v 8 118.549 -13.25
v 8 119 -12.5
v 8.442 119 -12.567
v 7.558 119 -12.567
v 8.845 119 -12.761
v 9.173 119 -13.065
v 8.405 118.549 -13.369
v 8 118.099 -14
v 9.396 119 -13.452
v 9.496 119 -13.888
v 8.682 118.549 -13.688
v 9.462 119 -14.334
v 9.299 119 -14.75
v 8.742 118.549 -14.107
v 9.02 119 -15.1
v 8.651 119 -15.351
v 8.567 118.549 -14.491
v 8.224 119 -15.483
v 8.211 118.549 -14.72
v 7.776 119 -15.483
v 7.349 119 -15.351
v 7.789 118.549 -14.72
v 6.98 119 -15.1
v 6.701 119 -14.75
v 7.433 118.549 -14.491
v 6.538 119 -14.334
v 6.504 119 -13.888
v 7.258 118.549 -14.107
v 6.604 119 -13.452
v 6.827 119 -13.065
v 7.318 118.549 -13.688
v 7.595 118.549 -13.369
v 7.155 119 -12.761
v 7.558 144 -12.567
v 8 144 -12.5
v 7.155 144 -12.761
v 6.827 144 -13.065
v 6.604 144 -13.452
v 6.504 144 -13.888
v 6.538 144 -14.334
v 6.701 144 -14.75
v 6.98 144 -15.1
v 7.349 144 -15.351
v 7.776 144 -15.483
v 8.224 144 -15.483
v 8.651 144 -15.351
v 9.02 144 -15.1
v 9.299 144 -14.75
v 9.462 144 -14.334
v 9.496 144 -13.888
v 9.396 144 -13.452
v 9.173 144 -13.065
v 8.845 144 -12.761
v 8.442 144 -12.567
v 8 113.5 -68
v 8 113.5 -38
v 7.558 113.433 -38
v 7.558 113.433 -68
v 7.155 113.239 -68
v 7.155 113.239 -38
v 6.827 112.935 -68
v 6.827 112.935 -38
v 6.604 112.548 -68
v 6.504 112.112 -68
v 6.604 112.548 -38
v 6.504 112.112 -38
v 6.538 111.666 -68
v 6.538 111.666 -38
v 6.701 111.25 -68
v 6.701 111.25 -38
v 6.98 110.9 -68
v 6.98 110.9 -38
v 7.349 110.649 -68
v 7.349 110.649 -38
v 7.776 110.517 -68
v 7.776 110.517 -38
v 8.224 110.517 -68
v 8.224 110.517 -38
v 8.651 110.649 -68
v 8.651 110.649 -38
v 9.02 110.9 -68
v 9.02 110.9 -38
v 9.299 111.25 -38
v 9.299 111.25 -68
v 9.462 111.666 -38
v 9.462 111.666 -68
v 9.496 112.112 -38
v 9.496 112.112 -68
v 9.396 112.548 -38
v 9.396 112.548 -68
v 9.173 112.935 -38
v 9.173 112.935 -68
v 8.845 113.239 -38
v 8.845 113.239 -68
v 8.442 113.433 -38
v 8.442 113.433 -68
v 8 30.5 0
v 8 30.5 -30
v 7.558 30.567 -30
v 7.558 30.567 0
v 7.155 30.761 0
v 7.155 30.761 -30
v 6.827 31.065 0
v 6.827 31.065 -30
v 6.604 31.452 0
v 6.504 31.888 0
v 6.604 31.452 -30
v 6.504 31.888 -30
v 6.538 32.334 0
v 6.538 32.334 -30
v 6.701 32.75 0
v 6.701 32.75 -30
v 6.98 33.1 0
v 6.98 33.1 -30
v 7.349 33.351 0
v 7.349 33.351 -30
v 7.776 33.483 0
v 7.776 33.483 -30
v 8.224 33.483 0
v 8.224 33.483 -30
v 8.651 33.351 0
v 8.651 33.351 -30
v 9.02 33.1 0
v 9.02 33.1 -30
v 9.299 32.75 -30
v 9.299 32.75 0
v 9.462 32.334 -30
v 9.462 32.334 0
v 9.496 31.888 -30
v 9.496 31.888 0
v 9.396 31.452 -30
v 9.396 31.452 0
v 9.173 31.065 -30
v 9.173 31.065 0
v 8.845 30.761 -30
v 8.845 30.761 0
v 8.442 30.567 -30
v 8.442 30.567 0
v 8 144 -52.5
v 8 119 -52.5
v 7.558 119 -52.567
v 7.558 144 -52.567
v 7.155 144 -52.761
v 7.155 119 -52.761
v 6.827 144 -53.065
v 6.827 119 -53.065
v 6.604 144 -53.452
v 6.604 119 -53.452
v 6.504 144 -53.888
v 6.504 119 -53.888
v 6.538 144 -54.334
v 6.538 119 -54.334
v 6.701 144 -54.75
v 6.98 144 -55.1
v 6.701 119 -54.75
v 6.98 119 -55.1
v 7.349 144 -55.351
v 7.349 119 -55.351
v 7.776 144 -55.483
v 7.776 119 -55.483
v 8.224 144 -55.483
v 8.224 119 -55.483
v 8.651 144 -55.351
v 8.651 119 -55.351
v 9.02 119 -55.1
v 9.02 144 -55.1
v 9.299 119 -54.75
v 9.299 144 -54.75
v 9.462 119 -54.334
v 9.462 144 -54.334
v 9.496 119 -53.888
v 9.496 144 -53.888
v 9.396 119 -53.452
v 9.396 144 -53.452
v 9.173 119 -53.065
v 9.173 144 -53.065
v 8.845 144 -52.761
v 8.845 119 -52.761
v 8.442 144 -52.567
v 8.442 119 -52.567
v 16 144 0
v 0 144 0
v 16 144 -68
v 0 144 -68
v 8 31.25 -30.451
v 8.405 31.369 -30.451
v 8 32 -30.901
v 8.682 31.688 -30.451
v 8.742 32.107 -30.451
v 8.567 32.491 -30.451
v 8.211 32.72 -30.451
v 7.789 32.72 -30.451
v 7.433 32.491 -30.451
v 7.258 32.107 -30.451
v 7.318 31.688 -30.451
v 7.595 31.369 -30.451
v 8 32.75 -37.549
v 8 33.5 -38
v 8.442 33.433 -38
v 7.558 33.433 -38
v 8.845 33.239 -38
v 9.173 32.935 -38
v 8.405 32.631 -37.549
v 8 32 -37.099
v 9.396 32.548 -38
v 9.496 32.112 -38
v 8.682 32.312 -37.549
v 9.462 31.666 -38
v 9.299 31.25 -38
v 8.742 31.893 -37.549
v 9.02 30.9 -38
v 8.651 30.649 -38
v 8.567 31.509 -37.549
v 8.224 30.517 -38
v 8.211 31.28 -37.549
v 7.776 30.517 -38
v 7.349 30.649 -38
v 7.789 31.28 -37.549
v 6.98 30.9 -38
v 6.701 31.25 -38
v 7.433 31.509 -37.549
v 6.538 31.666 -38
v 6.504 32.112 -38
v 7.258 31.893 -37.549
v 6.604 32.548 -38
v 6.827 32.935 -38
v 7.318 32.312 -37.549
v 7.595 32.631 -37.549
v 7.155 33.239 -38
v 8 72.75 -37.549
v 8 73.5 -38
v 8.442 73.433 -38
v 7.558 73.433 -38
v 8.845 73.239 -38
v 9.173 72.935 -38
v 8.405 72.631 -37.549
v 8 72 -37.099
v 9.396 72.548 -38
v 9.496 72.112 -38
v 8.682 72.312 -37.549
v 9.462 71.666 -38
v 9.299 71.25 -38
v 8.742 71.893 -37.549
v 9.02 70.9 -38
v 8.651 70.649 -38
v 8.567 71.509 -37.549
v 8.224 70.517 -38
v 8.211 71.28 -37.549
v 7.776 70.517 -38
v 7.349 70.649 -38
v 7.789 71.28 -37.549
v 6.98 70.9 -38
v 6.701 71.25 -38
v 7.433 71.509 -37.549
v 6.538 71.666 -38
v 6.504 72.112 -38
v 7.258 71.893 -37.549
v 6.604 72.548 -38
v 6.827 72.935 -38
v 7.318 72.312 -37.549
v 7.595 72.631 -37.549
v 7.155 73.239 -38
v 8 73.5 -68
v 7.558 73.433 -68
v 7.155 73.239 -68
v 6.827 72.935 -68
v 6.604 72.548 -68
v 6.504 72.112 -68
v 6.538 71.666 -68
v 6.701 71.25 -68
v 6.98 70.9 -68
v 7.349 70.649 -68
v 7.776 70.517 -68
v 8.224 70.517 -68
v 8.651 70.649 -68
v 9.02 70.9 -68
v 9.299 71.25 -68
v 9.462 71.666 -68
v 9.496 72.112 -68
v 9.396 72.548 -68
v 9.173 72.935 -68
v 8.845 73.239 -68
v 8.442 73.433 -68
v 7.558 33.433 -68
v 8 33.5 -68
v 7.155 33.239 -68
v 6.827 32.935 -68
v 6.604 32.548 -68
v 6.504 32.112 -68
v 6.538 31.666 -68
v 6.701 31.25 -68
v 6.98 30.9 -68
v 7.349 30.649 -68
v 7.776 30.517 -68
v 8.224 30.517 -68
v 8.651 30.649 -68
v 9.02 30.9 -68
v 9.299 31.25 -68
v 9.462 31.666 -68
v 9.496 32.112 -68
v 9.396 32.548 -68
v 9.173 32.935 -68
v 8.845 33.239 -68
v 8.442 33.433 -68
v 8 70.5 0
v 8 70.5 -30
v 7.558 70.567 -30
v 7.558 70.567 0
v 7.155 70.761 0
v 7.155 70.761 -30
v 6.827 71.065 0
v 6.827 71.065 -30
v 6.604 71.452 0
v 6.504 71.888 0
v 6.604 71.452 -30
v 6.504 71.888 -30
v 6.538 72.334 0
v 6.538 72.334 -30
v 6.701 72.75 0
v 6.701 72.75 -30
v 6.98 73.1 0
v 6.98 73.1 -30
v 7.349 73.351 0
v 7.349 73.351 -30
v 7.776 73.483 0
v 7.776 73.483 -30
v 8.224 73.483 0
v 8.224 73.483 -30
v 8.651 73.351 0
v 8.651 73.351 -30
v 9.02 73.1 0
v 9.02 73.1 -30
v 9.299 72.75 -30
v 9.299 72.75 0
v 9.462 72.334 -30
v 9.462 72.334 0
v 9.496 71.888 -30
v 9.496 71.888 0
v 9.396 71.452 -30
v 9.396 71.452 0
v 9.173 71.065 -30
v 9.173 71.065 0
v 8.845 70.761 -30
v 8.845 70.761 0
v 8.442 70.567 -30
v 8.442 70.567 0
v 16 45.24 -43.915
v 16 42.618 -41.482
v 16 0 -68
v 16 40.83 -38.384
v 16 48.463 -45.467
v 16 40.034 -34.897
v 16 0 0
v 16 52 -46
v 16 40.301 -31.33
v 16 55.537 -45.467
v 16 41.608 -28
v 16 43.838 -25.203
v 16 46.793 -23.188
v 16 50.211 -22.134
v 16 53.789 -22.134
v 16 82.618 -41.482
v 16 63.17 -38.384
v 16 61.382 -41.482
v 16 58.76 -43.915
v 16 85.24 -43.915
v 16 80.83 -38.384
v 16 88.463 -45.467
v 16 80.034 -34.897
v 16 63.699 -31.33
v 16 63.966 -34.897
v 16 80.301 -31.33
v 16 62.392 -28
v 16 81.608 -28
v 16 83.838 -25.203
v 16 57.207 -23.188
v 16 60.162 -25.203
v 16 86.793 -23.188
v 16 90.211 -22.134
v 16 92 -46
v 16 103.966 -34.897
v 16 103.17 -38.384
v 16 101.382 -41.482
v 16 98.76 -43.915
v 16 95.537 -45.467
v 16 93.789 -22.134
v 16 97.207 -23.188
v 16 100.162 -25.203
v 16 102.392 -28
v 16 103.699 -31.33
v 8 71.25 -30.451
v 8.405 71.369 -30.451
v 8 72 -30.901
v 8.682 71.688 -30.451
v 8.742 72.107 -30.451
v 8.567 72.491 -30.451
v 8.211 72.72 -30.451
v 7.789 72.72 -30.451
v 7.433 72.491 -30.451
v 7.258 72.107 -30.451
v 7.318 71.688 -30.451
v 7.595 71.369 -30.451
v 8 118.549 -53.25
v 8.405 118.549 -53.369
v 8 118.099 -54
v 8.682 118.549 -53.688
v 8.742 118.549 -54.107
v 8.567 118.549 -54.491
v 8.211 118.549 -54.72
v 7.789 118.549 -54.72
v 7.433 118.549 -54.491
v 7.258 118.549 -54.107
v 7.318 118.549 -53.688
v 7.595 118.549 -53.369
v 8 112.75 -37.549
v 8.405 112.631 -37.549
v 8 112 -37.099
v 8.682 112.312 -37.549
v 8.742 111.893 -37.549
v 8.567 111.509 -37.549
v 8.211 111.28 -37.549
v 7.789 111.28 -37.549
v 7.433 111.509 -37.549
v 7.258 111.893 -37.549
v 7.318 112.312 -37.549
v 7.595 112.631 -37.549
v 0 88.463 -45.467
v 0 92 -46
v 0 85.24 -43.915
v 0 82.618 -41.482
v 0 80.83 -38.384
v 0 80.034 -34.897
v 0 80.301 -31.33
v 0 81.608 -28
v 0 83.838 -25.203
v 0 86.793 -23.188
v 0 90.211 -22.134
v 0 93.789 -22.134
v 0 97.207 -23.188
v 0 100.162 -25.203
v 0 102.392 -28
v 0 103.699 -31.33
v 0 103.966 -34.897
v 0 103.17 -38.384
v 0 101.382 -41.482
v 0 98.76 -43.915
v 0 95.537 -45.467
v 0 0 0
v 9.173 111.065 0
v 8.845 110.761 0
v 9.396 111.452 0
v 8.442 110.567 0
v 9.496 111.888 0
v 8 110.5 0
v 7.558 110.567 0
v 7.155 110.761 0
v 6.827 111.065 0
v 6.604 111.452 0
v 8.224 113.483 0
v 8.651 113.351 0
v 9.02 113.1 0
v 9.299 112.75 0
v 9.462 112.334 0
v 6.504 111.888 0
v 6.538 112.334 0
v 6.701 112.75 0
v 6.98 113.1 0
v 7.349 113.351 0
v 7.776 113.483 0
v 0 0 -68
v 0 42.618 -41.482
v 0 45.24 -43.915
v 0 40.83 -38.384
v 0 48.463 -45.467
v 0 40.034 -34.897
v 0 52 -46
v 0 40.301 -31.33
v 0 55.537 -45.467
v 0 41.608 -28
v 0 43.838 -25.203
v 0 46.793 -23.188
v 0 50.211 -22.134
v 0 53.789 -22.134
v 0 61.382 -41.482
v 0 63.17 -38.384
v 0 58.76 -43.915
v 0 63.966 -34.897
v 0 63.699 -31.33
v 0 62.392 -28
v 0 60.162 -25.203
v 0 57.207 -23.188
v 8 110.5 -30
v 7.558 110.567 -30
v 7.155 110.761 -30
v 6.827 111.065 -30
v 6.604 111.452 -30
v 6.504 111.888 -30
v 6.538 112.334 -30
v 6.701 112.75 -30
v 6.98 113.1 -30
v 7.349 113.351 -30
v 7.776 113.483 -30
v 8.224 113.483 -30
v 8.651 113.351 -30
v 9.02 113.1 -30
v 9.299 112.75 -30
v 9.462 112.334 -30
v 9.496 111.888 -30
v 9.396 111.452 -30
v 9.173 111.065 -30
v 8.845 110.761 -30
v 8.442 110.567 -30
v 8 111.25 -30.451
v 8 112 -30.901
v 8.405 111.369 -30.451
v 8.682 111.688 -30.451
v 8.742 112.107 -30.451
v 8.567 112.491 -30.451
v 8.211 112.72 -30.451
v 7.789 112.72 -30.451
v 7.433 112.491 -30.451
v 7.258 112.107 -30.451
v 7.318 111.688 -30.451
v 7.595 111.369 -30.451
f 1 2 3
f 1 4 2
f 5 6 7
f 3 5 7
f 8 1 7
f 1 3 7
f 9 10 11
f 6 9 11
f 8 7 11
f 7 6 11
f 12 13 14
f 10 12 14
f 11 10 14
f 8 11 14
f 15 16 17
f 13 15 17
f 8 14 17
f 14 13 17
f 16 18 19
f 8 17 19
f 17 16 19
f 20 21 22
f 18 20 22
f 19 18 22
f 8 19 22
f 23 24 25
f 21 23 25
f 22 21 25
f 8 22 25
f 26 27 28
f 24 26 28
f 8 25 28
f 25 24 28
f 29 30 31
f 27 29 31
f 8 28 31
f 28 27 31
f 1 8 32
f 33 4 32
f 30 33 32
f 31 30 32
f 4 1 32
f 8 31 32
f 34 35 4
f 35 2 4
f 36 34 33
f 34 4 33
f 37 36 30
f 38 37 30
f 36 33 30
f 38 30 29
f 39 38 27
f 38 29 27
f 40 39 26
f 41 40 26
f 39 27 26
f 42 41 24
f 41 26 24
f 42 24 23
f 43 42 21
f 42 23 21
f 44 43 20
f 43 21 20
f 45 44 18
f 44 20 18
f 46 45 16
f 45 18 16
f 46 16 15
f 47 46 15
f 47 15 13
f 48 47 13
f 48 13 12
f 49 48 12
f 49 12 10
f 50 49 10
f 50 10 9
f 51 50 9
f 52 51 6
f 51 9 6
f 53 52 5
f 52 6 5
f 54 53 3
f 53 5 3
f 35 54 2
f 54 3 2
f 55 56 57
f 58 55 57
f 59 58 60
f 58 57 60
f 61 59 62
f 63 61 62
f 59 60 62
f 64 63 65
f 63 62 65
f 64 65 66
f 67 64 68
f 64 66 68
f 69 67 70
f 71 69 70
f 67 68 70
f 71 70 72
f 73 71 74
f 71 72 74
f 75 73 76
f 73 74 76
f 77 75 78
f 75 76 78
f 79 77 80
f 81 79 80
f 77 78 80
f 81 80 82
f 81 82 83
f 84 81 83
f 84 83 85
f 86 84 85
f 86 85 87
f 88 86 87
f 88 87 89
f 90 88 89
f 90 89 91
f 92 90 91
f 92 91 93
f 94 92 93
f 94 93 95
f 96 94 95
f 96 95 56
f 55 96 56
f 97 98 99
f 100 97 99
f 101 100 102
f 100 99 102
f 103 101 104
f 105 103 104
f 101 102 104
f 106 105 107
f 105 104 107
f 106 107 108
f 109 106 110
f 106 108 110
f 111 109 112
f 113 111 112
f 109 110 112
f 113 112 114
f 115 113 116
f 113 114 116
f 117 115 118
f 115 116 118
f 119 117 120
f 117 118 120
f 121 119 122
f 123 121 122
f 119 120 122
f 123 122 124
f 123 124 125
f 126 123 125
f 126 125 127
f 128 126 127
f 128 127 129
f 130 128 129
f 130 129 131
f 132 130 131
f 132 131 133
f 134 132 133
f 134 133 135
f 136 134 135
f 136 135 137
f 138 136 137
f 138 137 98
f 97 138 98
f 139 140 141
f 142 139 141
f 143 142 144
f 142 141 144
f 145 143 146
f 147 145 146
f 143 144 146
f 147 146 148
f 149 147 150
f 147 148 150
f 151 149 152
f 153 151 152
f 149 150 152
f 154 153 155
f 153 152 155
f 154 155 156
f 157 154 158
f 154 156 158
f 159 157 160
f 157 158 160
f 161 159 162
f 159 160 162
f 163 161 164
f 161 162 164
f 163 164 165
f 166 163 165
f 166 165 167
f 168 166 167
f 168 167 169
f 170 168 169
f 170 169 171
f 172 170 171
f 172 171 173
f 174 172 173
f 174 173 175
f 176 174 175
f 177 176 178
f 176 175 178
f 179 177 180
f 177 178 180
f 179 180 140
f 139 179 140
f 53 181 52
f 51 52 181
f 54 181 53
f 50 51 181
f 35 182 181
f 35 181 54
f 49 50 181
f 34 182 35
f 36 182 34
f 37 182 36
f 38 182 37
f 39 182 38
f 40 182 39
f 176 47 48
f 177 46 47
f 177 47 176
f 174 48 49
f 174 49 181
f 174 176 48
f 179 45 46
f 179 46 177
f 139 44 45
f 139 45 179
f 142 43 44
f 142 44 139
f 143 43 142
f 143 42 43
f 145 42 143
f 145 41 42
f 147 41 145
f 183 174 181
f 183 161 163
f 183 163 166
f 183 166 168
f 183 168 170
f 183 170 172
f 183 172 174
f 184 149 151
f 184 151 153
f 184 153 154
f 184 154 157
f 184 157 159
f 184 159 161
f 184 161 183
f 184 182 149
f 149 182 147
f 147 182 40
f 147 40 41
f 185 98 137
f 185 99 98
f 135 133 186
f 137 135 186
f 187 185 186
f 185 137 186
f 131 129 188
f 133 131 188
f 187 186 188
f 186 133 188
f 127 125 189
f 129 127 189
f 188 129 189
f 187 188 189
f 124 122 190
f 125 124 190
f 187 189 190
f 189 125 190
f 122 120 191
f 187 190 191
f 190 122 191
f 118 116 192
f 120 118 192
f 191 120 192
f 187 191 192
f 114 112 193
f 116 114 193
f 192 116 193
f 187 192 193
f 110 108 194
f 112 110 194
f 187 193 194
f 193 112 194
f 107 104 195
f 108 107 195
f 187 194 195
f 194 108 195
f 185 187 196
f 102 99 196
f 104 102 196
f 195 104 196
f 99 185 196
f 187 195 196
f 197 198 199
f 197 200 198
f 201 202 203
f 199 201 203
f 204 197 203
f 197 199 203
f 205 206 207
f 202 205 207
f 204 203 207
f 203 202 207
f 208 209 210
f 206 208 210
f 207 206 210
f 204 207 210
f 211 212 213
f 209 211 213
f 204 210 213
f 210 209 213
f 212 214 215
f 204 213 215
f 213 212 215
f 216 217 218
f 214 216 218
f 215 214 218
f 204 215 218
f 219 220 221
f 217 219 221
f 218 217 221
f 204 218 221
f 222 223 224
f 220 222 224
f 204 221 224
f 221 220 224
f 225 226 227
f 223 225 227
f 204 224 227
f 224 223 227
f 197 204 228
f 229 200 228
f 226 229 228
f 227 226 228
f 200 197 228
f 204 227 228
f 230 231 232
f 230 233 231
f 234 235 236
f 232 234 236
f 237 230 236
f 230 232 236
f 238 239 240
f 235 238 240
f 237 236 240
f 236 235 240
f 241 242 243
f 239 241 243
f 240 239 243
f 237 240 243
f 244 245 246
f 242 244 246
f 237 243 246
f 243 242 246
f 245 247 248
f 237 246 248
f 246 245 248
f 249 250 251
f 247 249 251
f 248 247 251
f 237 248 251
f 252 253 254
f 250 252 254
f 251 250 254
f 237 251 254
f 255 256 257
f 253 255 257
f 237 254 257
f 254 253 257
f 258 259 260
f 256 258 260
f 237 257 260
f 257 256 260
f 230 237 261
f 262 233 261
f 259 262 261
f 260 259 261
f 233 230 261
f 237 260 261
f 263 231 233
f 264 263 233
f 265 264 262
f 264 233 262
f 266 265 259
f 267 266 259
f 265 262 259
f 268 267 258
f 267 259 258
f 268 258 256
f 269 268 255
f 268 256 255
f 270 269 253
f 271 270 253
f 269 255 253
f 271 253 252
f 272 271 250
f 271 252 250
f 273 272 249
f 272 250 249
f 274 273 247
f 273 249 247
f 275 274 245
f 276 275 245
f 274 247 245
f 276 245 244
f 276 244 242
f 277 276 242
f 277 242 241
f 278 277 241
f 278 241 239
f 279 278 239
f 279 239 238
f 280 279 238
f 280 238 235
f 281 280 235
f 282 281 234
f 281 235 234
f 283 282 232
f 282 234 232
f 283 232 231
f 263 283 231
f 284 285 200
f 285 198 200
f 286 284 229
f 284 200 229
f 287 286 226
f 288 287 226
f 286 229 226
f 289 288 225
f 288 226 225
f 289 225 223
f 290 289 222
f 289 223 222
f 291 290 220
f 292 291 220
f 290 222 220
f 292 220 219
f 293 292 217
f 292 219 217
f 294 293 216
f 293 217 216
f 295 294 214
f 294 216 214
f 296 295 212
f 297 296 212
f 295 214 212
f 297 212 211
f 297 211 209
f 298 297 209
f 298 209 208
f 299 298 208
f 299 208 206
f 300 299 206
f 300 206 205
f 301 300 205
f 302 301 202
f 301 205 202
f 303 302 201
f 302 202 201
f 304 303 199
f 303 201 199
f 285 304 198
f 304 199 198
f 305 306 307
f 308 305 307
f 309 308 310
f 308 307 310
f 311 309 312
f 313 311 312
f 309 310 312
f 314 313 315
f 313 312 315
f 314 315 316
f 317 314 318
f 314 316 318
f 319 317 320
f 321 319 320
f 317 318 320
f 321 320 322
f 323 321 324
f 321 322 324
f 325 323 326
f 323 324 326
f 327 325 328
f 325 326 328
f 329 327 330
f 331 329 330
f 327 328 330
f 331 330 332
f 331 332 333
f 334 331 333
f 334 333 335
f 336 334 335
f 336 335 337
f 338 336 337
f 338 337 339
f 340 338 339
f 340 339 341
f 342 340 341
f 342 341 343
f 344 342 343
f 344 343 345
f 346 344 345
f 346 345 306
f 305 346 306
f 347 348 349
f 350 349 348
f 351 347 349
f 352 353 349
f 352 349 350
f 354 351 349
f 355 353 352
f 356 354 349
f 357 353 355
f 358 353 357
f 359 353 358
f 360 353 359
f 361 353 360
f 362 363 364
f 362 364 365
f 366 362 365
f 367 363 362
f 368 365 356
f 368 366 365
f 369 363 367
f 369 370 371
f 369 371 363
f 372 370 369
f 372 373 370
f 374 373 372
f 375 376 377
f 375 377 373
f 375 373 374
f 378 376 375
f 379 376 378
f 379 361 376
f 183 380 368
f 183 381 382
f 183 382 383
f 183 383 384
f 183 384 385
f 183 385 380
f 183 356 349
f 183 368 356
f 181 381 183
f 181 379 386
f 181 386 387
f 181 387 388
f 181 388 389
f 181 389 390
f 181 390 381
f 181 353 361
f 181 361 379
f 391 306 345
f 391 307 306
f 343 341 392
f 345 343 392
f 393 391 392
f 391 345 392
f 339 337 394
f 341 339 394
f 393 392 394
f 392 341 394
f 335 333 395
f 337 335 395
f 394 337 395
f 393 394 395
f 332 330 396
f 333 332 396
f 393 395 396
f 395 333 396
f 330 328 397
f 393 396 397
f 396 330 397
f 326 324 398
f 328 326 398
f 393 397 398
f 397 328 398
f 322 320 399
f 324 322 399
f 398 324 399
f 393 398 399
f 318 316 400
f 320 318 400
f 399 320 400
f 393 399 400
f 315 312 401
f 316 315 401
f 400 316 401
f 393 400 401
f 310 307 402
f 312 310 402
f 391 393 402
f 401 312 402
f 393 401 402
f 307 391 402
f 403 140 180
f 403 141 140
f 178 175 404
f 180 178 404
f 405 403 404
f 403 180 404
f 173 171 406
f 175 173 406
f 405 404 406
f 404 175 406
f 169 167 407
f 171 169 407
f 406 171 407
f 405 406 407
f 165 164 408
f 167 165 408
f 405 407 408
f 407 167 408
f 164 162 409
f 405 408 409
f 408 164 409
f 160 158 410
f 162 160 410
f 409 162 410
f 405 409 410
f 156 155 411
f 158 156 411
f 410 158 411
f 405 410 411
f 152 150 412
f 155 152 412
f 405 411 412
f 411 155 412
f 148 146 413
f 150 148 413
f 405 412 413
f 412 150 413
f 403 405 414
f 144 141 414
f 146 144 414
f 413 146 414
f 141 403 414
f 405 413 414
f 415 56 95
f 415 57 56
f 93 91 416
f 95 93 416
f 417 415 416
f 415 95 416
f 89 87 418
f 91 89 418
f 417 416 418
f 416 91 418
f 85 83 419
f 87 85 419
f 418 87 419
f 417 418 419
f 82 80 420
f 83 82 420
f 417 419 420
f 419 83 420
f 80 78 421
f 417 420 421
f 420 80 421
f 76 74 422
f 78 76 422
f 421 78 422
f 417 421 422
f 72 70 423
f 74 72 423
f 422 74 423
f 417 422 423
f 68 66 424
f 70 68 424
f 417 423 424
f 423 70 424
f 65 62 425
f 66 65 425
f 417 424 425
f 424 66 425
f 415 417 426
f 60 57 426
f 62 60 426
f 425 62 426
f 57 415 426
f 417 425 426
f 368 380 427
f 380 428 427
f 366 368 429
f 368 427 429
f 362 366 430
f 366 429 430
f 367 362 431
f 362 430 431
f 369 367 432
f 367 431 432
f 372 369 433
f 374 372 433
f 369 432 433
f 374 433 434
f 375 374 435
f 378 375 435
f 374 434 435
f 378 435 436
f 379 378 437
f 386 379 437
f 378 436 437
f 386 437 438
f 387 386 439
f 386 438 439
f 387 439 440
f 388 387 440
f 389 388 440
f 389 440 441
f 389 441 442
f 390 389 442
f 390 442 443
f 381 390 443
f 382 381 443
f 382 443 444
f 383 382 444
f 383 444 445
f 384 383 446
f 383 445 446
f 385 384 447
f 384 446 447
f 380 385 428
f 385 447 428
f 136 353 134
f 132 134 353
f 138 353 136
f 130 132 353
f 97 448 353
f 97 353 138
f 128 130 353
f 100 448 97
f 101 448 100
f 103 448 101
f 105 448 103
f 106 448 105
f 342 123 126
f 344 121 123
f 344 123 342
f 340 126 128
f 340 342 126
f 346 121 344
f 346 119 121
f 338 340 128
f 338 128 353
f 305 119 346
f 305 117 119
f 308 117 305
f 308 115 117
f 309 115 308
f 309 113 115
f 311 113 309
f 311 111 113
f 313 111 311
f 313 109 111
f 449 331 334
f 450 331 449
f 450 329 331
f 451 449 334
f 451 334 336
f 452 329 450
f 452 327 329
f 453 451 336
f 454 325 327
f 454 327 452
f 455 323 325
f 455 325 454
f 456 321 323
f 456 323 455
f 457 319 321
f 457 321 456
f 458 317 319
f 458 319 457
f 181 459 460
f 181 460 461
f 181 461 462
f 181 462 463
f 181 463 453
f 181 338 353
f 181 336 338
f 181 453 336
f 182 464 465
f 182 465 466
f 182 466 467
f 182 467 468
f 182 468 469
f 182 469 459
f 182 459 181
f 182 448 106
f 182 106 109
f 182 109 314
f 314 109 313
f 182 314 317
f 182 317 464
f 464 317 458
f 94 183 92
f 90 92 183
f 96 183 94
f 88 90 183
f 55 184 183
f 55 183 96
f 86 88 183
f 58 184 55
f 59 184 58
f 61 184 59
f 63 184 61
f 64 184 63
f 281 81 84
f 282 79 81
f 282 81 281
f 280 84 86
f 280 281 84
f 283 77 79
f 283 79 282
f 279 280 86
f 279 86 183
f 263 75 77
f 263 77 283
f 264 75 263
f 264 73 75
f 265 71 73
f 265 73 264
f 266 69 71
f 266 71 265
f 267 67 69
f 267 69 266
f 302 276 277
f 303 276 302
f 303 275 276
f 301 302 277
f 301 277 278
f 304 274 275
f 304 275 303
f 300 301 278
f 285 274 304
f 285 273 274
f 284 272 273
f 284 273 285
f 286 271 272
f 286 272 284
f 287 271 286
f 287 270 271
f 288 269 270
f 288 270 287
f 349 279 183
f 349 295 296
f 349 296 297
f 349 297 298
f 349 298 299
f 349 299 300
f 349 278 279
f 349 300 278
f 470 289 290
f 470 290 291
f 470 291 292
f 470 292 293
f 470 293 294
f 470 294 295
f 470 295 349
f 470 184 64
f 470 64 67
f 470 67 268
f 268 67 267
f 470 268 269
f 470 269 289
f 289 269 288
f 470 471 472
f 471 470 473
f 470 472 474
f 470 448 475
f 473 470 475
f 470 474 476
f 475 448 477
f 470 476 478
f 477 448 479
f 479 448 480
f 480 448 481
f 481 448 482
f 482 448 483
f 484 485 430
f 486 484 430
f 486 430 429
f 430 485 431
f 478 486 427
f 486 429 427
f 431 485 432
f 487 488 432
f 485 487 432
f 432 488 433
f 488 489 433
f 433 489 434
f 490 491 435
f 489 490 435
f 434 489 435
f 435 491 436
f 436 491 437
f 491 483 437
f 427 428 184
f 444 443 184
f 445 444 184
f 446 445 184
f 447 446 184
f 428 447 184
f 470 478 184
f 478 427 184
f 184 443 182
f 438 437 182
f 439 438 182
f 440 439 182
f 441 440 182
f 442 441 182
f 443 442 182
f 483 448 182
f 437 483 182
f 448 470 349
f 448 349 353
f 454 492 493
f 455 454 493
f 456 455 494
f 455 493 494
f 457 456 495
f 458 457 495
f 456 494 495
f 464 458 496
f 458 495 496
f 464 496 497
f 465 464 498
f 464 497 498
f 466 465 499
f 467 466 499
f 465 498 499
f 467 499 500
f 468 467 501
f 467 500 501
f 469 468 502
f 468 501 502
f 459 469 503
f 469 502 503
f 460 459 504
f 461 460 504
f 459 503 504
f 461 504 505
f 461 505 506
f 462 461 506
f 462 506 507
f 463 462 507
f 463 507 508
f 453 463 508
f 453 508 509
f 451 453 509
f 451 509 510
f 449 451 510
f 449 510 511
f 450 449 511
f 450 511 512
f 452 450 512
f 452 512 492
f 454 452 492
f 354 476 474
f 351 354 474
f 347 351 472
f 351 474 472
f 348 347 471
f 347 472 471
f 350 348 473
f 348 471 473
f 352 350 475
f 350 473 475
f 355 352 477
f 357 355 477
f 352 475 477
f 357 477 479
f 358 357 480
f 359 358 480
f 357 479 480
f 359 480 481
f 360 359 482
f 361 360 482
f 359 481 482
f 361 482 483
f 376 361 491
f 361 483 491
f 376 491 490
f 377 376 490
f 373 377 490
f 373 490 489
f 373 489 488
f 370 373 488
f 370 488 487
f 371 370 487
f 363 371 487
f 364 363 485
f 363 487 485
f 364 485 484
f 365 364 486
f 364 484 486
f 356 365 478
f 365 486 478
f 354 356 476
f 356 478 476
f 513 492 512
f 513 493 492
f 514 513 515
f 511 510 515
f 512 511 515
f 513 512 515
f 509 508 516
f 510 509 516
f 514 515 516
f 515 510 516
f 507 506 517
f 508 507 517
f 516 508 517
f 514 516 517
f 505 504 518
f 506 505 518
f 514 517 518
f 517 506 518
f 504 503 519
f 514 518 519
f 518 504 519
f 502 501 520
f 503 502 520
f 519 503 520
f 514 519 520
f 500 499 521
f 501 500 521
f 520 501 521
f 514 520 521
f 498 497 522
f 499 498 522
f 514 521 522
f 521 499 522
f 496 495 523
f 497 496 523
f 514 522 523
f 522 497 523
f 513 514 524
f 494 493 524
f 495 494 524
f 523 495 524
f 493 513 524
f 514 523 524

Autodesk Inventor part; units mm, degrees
ref_plane "YZ Plane" through (0, 0, 0) normal (1, 0, 0) x (0, 1, 0)
ref_plane "XZ Plane" through (0, 0, 0) normal (0, 1, 0) x (-1, 0, 0)
ref_plane "XY Plane" through (0, 0, 0) normal (0, 0, 1) x (1, 0, 0)
sketch "Skizze1" plane through (0, 0, 0) normal (1, 0, 0) x (0, 1, 0)
  line L0 (0, 0) -> (144, 0)
  line L1 (144, 0) -> (144, -68)
  line L2 (144, -68) -> (0, -68)
  line L3 (0, -68) -> (0, 0)
  dimension "d0" = 144
  dimension "d1" = 68
extrude "Extrusion1" add sketch "Skizze1" along normal blind 16
sketch "Skizze2" plane through (0, 0, 0) normal (0, 0, 1) x (1, 0, 0)
  line L0 (0, 0) -> (0, 144) construction
  line L1 (0, 72) -> (16, 72) construction
  line L2 (16, 144) -> (16, 0) construction
  line L3 (0, 144) -> (16, 144) construction
  line L4 (8, 144) -> (8, 0) construction
  line L5 (0, 144) -> (16, 144) construction
  line L6 (0, 0) -> (16, 0) construction
  line L7 (0, 144) -> (16, 144) construction
  line L8 (16, 144) -> (16, 0) construction
  line L9 (16, 0) -> (0, 0) construction
  line L10 (0, 0) -> (0, 144) construction
  line L11 (0, 112) -> (16, 112) construction
  line L12 (0, 32) -> (16, 32) construction
  point P0 (8, 112)
  point P1 (8, 72)
  point P2 (8, 32)
  dimension "d4" = 40
  dimension "d5" = 40
hole "Bohrung1" at (8, 112, 0) at (8, 72, 0) at (8, 32, 0) direction (0, 0, -1) diameter 3 depth 30 tip angle 118
sketch "Skizze3" plane through (0, 144, 0) normal (0, 1, 0) x (1, 0, 0)
  line L0 (0, 0) -> (16, 0)
  line L1 (16, 0) -> (16, 68)
  line L2 (16, 68) -> (0, 68)
  line L3 (0, 68) -> (0, 0)
  line L4 (8, 0) -> (8, 68) construction
  line L5 (0, 68) -> (16, 68) construction
  line L6 (16, 0) -> (16, 68) construction
  line L7 (16, 34) -> (0, 34) construction
  line L8 (0, 68) -> (0, 0) construction
  line L9 (0, 14) -> (16, 14) construction
  line L10 (0, 54) -> (16, 54) construction
  point P0 (8, 14)
  point P1 (8, 54)
  dimension "d13" = 14
  dimension "d22" = 14
hole "Bohrung2" at (8, 144, -14) at (8, 144, -54) direction (0, -1, 0) diameter 3 depth 25 tip angle 118
sketch "Skizze4" plane through (0, 0, -68) normal (0, 0, -1) x (-1, 0, 0)
  line L0 (0, 0) -> (-16, 0) construction
  line L1 (-16, 0) -> (-16, 144) construction
  line L2 (-16, 144) -> (0, 144) construction
  line L3 (0, 144) -> (0, 0) construction
  line L4 (-8, 0) -> (-8, 144) construction
  line L5 (-16, 144) -> (-16, 0) construction
  line L6 (-16, 72) -> (0, 72) construction
  circle A0 centre (-8, 72) radius 1.5 construction
  point P0 (-8, 112)
  point P1 (-8, 32)
  dimension "d23" = 40
  dimension "d24" = 40
hole "Bohrung3" at (8, 72, -68) at (8, 112, -68) at (8, 32, -68) direction (0, 0, 1) diameter 3 depth 30 tip angle 118
sketch "Skizze5" plane through (16, 0, 0) normal (1, 0, 0) x (0, 0, -1)
  line L0 (0, 0) -> (68, 0) construction
  line L1 (68, 0) -> (68, 144) construction
  line L2 (68, 144) -> (0, 144) construction
  line L3 (0, 144) -> (0, 0) construction
  line L4 (0, 0) -> (68, 0) construction
  line L5 (34, 0) -> (34, 144) construction
  line L6 (0, 72) -> (68, 72) construction
  line L7 (68, 73.5) -> (68, 70.5) construction
  point P0 (34, 52)
  point P1 (34, 92)
  dimension "d32" = 20
  dimension "d33" = 20
hole "Bohrung4" at (16, 52, -34) at (16, 92, -34) direction (-1, 0, 0) diameter 24 end through all
equation "\"d39\" = Stärke"
equation "\"Biegeradius\" = Stärke"
equation "\"BreiteBiegungsfreistellung\" = Stärke"
equation "\"TiefeBiegungsfreistellung\" = 0.5 * Stärke"
equation "\"GrößeEckenfreistellung\" = 4 * Stärke"
equation "\"MinimalRest\" = 2 * Stärke"
equation "\"Übergangsradius\" = Biegeradius"
equation "\"JacobiRadiusGröße\" = Biegeradius"
equation "\"Abstandsgröße\" = Stärke"
equation "\"Stärke\" = 0.5"
properties part number "licht_side_200_middle"
